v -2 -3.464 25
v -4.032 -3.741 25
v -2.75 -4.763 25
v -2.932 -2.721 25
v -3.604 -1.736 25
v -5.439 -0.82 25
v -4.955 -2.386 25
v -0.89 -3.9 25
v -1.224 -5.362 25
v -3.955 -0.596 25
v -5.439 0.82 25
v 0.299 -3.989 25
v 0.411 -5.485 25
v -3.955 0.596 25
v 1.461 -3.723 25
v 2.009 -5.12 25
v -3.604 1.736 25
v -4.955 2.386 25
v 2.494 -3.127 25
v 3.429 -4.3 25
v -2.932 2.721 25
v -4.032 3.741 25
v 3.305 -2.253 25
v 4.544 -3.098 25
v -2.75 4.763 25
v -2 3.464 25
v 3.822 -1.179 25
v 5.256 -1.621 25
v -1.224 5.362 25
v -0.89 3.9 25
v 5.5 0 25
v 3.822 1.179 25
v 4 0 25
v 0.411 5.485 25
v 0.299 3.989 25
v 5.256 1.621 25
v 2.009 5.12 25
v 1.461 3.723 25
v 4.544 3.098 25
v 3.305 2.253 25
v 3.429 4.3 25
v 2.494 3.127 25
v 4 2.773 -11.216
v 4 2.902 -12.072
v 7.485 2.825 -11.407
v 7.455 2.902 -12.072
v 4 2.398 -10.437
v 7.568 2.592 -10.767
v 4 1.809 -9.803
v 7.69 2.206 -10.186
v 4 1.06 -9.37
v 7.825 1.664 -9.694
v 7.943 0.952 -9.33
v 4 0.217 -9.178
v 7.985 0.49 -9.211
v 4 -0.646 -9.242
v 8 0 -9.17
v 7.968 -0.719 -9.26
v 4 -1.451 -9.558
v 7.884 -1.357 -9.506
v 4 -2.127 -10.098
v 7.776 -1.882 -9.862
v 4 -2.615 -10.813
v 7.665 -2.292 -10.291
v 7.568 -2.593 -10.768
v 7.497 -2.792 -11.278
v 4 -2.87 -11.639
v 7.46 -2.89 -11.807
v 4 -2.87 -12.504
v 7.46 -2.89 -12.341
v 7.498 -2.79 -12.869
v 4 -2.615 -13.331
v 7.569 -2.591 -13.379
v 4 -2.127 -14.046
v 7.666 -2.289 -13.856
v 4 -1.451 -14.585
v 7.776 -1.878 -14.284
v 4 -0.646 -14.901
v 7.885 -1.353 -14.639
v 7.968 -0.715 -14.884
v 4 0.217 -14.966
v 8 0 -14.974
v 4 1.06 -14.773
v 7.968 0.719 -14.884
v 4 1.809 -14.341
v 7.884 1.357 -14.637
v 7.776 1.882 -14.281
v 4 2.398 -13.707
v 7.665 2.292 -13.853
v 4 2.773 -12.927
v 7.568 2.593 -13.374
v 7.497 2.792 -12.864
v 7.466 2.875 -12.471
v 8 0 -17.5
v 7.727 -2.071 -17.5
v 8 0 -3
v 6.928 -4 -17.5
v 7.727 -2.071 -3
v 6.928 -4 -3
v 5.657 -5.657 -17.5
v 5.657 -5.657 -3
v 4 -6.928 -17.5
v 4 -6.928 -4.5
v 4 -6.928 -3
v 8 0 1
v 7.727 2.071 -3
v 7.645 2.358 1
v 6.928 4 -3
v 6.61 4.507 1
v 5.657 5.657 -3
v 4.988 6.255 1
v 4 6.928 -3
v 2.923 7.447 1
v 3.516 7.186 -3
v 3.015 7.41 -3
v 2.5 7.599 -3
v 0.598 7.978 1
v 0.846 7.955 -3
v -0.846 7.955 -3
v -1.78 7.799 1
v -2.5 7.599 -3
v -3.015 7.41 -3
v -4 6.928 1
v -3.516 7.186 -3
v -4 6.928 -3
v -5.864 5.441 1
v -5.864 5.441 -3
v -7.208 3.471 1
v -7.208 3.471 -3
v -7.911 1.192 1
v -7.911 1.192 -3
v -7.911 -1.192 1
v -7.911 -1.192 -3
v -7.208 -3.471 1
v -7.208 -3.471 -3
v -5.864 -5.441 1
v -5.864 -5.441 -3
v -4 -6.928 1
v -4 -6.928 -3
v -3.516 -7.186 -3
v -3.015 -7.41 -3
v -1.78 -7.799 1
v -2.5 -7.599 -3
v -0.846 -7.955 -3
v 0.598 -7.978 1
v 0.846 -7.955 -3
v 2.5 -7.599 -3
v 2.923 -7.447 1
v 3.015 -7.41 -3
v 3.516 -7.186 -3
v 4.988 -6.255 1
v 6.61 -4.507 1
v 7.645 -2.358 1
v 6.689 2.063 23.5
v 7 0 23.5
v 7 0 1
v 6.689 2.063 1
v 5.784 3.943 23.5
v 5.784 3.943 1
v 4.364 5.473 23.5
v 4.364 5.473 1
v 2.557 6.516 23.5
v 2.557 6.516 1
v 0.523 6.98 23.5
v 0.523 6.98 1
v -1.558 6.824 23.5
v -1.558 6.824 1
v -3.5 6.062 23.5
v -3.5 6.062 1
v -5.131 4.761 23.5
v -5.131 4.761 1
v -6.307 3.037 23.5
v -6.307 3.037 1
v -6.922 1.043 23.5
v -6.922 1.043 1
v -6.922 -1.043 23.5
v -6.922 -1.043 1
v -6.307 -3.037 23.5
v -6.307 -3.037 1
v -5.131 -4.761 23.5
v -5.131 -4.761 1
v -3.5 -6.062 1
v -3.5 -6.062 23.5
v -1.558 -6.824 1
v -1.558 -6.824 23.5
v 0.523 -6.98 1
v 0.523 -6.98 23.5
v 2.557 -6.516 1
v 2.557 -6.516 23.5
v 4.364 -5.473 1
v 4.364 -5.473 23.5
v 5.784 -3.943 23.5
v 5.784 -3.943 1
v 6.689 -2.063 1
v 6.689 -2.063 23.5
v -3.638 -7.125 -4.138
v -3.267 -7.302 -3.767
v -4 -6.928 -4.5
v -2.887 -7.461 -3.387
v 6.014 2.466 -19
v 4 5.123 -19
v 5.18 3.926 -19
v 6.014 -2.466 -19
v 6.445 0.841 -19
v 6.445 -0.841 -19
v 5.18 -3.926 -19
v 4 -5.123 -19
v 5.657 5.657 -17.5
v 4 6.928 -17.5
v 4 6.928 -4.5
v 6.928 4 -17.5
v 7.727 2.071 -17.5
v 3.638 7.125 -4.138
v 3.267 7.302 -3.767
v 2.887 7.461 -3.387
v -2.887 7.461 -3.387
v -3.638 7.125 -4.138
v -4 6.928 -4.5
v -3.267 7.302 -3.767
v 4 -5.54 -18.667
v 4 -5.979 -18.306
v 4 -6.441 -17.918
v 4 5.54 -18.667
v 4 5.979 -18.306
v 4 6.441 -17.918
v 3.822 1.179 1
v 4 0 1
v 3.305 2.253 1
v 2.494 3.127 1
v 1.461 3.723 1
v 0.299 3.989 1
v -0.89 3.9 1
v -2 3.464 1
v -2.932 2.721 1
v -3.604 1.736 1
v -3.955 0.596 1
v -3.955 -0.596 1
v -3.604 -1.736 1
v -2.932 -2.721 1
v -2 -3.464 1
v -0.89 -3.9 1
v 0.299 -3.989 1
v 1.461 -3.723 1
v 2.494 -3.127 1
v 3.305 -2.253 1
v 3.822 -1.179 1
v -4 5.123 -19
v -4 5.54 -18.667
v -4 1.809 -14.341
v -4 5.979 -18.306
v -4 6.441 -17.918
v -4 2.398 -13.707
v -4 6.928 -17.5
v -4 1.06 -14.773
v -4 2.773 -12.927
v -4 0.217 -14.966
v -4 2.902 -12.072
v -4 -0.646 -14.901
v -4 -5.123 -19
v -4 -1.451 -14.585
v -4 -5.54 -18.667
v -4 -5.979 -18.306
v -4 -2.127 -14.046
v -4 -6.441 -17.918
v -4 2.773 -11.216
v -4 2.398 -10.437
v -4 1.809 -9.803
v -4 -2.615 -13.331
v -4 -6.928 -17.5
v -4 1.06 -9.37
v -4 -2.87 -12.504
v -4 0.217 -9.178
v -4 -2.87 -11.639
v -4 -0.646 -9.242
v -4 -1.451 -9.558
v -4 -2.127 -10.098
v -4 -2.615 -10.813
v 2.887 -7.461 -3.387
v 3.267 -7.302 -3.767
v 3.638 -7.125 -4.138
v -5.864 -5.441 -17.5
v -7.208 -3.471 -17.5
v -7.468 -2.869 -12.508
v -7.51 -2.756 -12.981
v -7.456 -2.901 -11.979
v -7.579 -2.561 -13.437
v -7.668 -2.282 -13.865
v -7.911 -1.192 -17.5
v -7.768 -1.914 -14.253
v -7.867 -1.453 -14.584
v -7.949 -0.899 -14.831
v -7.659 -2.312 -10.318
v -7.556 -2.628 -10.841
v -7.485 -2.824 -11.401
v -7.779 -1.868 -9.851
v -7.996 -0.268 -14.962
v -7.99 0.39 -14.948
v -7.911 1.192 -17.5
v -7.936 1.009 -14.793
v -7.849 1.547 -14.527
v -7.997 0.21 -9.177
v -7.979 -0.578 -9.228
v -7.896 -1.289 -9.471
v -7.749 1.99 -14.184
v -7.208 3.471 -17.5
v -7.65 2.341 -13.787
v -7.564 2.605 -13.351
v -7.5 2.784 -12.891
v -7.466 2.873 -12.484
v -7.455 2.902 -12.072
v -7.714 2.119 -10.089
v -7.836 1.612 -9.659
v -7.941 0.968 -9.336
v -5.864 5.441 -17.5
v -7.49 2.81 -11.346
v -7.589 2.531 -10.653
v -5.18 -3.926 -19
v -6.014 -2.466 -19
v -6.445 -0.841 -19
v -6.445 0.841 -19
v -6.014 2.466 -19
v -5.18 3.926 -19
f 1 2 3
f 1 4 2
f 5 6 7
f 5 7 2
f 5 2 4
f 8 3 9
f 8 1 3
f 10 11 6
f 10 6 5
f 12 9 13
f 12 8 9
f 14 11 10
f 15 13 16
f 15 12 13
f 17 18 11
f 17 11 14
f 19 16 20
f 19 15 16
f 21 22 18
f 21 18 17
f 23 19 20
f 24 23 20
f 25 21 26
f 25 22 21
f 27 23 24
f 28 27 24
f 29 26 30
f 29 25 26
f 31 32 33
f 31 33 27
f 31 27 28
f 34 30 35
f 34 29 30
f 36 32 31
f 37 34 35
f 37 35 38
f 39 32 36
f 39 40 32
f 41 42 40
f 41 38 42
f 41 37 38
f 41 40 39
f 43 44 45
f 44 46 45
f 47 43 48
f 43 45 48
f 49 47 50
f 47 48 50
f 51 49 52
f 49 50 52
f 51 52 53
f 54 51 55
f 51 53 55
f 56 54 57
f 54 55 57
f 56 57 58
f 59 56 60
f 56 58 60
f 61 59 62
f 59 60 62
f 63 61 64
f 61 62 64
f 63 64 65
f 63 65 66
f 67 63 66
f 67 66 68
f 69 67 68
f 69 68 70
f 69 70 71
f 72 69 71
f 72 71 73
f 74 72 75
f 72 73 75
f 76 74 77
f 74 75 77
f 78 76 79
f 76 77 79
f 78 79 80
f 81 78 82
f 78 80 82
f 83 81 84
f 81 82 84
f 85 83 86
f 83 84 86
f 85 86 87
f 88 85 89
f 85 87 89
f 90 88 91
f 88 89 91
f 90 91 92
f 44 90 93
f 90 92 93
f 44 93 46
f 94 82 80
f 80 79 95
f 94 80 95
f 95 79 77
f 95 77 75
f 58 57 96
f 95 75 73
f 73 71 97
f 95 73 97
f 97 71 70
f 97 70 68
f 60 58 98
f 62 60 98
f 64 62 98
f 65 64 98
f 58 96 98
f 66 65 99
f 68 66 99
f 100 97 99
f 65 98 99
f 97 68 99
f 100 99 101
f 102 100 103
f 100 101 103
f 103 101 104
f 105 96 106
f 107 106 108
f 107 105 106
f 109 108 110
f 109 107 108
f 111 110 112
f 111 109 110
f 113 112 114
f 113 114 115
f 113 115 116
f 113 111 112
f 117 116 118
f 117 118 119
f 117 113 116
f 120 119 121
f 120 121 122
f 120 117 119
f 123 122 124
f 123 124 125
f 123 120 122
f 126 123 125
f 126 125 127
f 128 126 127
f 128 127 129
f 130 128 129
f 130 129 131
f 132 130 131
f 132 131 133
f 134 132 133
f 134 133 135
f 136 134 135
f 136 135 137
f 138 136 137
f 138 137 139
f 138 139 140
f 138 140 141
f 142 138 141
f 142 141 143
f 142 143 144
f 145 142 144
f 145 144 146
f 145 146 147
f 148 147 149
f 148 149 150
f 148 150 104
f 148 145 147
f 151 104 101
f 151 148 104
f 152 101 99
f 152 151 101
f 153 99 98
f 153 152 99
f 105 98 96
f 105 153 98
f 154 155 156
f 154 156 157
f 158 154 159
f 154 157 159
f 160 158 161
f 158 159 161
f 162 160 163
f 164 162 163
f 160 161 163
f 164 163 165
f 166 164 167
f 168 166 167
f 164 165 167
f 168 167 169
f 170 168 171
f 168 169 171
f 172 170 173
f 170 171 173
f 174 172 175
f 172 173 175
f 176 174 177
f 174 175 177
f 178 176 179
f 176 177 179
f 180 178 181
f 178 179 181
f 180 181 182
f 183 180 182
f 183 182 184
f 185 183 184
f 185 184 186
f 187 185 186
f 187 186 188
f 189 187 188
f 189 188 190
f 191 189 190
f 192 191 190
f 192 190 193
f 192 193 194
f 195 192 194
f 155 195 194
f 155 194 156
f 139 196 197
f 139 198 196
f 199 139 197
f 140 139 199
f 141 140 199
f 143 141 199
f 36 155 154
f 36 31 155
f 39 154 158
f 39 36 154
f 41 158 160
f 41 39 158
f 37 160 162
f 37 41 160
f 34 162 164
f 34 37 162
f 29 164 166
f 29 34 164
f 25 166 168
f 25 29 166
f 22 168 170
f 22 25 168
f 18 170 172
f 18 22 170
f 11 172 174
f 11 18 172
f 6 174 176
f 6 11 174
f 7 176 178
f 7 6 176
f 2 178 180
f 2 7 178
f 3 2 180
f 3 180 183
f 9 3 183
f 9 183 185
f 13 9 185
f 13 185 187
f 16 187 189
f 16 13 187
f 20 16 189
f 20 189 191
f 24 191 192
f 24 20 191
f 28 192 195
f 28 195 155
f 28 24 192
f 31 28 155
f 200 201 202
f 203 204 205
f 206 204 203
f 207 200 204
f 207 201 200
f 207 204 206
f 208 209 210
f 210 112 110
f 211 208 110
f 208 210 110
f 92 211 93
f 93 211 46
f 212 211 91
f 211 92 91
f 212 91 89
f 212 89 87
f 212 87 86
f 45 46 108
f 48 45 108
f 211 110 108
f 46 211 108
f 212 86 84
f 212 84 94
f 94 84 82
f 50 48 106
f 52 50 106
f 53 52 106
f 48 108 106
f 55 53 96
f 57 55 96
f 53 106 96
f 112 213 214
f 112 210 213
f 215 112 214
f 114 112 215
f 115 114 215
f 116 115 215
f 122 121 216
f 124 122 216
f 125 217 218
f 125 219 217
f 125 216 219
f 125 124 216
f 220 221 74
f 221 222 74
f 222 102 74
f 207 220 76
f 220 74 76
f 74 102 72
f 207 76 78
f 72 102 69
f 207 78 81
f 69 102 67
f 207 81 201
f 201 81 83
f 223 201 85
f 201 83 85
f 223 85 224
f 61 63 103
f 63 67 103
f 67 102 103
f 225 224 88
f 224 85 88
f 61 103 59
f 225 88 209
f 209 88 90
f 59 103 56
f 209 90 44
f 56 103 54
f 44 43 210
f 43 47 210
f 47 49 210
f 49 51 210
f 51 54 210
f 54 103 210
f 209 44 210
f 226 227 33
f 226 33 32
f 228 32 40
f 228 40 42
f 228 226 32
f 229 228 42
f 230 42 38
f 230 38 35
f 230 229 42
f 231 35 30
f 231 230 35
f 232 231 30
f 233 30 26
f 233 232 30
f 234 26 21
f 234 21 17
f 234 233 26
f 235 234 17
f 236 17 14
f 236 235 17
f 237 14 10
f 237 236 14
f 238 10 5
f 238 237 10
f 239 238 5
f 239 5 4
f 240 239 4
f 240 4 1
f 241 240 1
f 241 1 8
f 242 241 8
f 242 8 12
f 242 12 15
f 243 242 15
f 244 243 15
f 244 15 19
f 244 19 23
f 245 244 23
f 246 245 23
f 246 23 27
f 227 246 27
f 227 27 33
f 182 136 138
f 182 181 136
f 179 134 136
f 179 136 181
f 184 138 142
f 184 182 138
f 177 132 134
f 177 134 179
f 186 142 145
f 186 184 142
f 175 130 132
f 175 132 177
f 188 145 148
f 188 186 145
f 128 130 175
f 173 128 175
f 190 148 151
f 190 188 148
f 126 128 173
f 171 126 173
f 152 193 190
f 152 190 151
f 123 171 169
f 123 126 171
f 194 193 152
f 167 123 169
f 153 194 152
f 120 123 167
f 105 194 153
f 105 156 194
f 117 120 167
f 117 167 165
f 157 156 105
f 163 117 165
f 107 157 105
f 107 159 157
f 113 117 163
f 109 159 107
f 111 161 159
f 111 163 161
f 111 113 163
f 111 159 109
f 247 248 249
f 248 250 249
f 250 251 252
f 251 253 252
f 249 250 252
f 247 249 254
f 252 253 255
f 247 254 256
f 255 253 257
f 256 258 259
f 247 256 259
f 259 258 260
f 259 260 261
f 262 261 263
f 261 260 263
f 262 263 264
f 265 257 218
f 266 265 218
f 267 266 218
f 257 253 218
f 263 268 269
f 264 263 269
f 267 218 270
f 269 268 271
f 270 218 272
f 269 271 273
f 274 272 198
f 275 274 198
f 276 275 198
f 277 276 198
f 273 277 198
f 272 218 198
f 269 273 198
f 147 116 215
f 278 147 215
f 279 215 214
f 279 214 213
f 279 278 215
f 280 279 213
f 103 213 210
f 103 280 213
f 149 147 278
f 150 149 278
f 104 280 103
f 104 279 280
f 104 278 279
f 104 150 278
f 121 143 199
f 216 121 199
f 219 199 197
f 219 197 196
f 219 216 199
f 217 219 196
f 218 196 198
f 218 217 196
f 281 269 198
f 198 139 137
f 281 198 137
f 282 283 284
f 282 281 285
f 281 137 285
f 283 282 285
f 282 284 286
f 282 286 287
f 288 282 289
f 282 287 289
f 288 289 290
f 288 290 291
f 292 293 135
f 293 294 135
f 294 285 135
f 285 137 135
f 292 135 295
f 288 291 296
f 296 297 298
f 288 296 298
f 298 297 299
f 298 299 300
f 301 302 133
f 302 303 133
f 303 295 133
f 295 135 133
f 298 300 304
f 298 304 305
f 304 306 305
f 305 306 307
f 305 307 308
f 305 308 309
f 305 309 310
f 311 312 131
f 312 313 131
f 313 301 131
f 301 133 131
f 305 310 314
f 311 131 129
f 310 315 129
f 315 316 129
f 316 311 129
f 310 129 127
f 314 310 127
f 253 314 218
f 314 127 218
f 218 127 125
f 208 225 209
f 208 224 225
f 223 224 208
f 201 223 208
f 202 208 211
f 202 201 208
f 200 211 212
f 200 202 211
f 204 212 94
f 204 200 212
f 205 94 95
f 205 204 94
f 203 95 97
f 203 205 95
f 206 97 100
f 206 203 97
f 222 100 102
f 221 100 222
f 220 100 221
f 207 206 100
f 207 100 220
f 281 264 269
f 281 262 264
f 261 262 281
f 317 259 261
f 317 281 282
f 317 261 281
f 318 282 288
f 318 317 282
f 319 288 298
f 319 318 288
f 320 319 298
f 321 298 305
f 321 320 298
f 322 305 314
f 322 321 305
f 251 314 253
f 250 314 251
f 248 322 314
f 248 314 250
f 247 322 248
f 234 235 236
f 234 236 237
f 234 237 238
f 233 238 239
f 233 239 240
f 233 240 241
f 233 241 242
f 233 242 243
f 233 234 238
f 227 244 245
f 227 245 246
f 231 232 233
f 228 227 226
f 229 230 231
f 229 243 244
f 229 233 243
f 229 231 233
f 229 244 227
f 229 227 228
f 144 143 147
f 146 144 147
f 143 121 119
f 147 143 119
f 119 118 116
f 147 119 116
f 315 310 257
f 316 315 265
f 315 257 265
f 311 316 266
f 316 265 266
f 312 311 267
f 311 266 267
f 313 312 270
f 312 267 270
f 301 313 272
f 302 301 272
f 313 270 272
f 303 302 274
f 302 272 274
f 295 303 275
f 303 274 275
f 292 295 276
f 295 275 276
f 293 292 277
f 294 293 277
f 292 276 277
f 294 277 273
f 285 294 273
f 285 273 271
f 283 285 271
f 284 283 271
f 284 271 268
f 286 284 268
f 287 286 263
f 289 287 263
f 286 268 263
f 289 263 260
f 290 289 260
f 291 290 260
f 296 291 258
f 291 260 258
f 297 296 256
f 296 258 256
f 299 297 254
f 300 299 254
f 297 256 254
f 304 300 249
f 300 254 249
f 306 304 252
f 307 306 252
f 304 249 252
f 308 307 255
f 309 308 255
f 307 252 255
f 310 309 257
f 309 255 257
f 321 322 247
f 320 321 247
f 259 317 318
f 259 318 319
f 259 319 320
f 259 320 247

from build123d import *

# Parameters (mm, degrees)
F7_R          = 7
F7_R_2        = 4
F8_DEPTH      = 25
F9_DEPTH      = 1
F7_R_3        = 8
F10_DEPTH     = 1
F11_DEPTH     = 3
F13_DEPTH     = 16
F14_R         = 2.9021632183
F15_DEPTH     = 12.5
F16_T4_DEPTH  = 21.5714554244
F16_S5_R      = 8
F16_T6_DEPTH  = 12
F16_T10_DEPTH = 21.5714554244
F16_S11_R     = 8
F16_T12_DEPTH = 12
F16_T16_ANGLE = 175.2944368931
F16_T18_ANGLE = 175.2944368931


# Not quite as in the source:
# - a fillet or chamfer that OpenCascade refuses, or shapes differently, is made with other operations: its cross-section is extruded or revolved along the edge and cut away or added


with BuildPart() as f8:
    # F7 (on Top) → F8 (new body)
    with BuildSketch(Plane.XY):
        Circle(F7_R)
        Circle(F7_R_2, mode=Mode.SUBTRACT)
    extrude(amount=F8_DEPTH)

    # F7 (on Top) → F9 (join)
    with BuildSketch(Plane.XY):
        Circle(F7_R_2)
    extrude(amount=F9_DEPTH)

    # F7 (on Top) → F10 (join)
    with BuildSketch(Plane.XY):
        Circle(F7_R_3)
        Circle(F7_R, mode=Mode.SUBTRACT)
    extrude(amount=F10_DEPTH)

    # F7 (on Top) → F11 (join)
    with BuildSketch(Plane.XY):
        Circle(F7_R_3)
        Circle(F7_R, mode=Mode.SUBTRACT)
        Circle(F7_R)
        Circle(F7_R_2, mode=Mode.SUBTRACT)
        Circle(F7_R_2)
    extrude(amount=-F11_DEPTH)

    # F12 (on face) → F13 (join)
    with BuildSketch(Plane(origin=(0, 0, -3), x_dir=(1, 0, 0), z_dir=(0, 0, -1))):
        with BuildLine():
            Line((-4, -6.9282032303), (-4, 6.9282032303))
            ThreePointArc((-4, 6.9282032303), (-8, 0), (-4, -6.9282032303))
        make_face()
        with BuildLine():
            ThreePointArc((8, 0), (6.9282032303, 4), (4, 6.9282032303))
            Line((4, 6.9282032303), (4, -6.9282032303))
            ThreePointArc((4, -6.9282032303), (6.9282032303, -4), (8, 0))
        make_face()
    extrude(amount=F13_DEPTH)

    # F14 (on Right) → F15 (cut, symmetric)
    with BuildSketch(Plane.YZ):
        with Locations((0, -12.0717967697)):
            Circle(F14_R)
    extrude(amount=F15_DEPTH, both=True, mode=Mode.SUBTRACT)

    # F16: chamfer of 1.5 on 5 edges, made by hand


with BuildPart() as f16_tool2:
    # F16_s3 → F16_t4 (new body)
    with BuildSketch(Plane.XZ.offset(10.7857277122)):
        Polygon((2.5, -3), (4, -4.5), (4, -3), align=None)
    extrude(amount=-F16_T4_DEPTH)

    # F16_s5 → F16_t6 (intersect, symmetric)
    with BuildSketch(Plane.XY.offset(-3.8)):
        Circle(F16_S5_R)
    extrude(amount=F16_T6_DEPTH, both=True, mode=Mode.INTERSECT)


with BuildPart() as f8_1:
    add(f8.part)

    # F16_t1: union F16_tool2
    add(f16_tool2.part)


with BuildPart() as f16_tool8:
    # F16_s9 → F16_t10 (new body)
    with BuildSketch(Plane.XZ.offset(-10.7857277122)):
        Polygon((-2.5, -3), (-4, -4.5), (-4, -3), align=None)
    extrude(amount=F16_T10_DEPTH)

    # F16_s11 → F16_t12 (intersect, symmetric)
    with BuildSketch(Plane.XY.offset(-3.8)):
        Circle(F16_S11_R)
    extrude(amount=F16_T12_DEPTH, both=True, mode=Mode.INTERSECT)


with BuildPart() as f8_2:
    add(f8_1.part)

    # F16_t7: union F16_tool8
    add(f16_tool8.part)

    # F16_s13 → F16_t14 (revolve, cut)
    with BuildSketch(Plane.XZ):
        Polygon((7, 23.5), (5.5, 25), (7, 25), align=None)
    revolve(axis=Axis((0, 0, 25), (0, 0, 1)), mode=Mode.SUBTRACT)

    # F16_s15 → F16_t16 (revolve, cut)
    with BuildSketch(Plane(origin=(0, 0, 0), x_dir=(0, 0, 1), z_dir=(-0.9991570013, 0.0410522451, 0))):
        Polygon((-17.5, 8), (-19, 6.5), (-19, 8), align=None)
    revolve(axis=Axis((0, 0, -19), (0, 0, -1)), revolution_arc=F16_T16_ANGLE, mode=Mode.SUBTRACT)

    # F16_s17 → F16_t18 (revolve, cut)
    with BuildSketch(Plane(origin=(0, 0, 0), x_dir=(0, 0, 1), z_dir=(0.9991570013, -0.0410522451, 0))):
        Polygon((-17.5, 8), (-19, 6.5), (-19, 8), align=None)
    revolve(axis=Axis((0, 0, -19), (0, 0, -1)), revolution_arc=F16_T18_ANGLE, mode=Mode.SUBTRACT)


solid = f8_2.part
